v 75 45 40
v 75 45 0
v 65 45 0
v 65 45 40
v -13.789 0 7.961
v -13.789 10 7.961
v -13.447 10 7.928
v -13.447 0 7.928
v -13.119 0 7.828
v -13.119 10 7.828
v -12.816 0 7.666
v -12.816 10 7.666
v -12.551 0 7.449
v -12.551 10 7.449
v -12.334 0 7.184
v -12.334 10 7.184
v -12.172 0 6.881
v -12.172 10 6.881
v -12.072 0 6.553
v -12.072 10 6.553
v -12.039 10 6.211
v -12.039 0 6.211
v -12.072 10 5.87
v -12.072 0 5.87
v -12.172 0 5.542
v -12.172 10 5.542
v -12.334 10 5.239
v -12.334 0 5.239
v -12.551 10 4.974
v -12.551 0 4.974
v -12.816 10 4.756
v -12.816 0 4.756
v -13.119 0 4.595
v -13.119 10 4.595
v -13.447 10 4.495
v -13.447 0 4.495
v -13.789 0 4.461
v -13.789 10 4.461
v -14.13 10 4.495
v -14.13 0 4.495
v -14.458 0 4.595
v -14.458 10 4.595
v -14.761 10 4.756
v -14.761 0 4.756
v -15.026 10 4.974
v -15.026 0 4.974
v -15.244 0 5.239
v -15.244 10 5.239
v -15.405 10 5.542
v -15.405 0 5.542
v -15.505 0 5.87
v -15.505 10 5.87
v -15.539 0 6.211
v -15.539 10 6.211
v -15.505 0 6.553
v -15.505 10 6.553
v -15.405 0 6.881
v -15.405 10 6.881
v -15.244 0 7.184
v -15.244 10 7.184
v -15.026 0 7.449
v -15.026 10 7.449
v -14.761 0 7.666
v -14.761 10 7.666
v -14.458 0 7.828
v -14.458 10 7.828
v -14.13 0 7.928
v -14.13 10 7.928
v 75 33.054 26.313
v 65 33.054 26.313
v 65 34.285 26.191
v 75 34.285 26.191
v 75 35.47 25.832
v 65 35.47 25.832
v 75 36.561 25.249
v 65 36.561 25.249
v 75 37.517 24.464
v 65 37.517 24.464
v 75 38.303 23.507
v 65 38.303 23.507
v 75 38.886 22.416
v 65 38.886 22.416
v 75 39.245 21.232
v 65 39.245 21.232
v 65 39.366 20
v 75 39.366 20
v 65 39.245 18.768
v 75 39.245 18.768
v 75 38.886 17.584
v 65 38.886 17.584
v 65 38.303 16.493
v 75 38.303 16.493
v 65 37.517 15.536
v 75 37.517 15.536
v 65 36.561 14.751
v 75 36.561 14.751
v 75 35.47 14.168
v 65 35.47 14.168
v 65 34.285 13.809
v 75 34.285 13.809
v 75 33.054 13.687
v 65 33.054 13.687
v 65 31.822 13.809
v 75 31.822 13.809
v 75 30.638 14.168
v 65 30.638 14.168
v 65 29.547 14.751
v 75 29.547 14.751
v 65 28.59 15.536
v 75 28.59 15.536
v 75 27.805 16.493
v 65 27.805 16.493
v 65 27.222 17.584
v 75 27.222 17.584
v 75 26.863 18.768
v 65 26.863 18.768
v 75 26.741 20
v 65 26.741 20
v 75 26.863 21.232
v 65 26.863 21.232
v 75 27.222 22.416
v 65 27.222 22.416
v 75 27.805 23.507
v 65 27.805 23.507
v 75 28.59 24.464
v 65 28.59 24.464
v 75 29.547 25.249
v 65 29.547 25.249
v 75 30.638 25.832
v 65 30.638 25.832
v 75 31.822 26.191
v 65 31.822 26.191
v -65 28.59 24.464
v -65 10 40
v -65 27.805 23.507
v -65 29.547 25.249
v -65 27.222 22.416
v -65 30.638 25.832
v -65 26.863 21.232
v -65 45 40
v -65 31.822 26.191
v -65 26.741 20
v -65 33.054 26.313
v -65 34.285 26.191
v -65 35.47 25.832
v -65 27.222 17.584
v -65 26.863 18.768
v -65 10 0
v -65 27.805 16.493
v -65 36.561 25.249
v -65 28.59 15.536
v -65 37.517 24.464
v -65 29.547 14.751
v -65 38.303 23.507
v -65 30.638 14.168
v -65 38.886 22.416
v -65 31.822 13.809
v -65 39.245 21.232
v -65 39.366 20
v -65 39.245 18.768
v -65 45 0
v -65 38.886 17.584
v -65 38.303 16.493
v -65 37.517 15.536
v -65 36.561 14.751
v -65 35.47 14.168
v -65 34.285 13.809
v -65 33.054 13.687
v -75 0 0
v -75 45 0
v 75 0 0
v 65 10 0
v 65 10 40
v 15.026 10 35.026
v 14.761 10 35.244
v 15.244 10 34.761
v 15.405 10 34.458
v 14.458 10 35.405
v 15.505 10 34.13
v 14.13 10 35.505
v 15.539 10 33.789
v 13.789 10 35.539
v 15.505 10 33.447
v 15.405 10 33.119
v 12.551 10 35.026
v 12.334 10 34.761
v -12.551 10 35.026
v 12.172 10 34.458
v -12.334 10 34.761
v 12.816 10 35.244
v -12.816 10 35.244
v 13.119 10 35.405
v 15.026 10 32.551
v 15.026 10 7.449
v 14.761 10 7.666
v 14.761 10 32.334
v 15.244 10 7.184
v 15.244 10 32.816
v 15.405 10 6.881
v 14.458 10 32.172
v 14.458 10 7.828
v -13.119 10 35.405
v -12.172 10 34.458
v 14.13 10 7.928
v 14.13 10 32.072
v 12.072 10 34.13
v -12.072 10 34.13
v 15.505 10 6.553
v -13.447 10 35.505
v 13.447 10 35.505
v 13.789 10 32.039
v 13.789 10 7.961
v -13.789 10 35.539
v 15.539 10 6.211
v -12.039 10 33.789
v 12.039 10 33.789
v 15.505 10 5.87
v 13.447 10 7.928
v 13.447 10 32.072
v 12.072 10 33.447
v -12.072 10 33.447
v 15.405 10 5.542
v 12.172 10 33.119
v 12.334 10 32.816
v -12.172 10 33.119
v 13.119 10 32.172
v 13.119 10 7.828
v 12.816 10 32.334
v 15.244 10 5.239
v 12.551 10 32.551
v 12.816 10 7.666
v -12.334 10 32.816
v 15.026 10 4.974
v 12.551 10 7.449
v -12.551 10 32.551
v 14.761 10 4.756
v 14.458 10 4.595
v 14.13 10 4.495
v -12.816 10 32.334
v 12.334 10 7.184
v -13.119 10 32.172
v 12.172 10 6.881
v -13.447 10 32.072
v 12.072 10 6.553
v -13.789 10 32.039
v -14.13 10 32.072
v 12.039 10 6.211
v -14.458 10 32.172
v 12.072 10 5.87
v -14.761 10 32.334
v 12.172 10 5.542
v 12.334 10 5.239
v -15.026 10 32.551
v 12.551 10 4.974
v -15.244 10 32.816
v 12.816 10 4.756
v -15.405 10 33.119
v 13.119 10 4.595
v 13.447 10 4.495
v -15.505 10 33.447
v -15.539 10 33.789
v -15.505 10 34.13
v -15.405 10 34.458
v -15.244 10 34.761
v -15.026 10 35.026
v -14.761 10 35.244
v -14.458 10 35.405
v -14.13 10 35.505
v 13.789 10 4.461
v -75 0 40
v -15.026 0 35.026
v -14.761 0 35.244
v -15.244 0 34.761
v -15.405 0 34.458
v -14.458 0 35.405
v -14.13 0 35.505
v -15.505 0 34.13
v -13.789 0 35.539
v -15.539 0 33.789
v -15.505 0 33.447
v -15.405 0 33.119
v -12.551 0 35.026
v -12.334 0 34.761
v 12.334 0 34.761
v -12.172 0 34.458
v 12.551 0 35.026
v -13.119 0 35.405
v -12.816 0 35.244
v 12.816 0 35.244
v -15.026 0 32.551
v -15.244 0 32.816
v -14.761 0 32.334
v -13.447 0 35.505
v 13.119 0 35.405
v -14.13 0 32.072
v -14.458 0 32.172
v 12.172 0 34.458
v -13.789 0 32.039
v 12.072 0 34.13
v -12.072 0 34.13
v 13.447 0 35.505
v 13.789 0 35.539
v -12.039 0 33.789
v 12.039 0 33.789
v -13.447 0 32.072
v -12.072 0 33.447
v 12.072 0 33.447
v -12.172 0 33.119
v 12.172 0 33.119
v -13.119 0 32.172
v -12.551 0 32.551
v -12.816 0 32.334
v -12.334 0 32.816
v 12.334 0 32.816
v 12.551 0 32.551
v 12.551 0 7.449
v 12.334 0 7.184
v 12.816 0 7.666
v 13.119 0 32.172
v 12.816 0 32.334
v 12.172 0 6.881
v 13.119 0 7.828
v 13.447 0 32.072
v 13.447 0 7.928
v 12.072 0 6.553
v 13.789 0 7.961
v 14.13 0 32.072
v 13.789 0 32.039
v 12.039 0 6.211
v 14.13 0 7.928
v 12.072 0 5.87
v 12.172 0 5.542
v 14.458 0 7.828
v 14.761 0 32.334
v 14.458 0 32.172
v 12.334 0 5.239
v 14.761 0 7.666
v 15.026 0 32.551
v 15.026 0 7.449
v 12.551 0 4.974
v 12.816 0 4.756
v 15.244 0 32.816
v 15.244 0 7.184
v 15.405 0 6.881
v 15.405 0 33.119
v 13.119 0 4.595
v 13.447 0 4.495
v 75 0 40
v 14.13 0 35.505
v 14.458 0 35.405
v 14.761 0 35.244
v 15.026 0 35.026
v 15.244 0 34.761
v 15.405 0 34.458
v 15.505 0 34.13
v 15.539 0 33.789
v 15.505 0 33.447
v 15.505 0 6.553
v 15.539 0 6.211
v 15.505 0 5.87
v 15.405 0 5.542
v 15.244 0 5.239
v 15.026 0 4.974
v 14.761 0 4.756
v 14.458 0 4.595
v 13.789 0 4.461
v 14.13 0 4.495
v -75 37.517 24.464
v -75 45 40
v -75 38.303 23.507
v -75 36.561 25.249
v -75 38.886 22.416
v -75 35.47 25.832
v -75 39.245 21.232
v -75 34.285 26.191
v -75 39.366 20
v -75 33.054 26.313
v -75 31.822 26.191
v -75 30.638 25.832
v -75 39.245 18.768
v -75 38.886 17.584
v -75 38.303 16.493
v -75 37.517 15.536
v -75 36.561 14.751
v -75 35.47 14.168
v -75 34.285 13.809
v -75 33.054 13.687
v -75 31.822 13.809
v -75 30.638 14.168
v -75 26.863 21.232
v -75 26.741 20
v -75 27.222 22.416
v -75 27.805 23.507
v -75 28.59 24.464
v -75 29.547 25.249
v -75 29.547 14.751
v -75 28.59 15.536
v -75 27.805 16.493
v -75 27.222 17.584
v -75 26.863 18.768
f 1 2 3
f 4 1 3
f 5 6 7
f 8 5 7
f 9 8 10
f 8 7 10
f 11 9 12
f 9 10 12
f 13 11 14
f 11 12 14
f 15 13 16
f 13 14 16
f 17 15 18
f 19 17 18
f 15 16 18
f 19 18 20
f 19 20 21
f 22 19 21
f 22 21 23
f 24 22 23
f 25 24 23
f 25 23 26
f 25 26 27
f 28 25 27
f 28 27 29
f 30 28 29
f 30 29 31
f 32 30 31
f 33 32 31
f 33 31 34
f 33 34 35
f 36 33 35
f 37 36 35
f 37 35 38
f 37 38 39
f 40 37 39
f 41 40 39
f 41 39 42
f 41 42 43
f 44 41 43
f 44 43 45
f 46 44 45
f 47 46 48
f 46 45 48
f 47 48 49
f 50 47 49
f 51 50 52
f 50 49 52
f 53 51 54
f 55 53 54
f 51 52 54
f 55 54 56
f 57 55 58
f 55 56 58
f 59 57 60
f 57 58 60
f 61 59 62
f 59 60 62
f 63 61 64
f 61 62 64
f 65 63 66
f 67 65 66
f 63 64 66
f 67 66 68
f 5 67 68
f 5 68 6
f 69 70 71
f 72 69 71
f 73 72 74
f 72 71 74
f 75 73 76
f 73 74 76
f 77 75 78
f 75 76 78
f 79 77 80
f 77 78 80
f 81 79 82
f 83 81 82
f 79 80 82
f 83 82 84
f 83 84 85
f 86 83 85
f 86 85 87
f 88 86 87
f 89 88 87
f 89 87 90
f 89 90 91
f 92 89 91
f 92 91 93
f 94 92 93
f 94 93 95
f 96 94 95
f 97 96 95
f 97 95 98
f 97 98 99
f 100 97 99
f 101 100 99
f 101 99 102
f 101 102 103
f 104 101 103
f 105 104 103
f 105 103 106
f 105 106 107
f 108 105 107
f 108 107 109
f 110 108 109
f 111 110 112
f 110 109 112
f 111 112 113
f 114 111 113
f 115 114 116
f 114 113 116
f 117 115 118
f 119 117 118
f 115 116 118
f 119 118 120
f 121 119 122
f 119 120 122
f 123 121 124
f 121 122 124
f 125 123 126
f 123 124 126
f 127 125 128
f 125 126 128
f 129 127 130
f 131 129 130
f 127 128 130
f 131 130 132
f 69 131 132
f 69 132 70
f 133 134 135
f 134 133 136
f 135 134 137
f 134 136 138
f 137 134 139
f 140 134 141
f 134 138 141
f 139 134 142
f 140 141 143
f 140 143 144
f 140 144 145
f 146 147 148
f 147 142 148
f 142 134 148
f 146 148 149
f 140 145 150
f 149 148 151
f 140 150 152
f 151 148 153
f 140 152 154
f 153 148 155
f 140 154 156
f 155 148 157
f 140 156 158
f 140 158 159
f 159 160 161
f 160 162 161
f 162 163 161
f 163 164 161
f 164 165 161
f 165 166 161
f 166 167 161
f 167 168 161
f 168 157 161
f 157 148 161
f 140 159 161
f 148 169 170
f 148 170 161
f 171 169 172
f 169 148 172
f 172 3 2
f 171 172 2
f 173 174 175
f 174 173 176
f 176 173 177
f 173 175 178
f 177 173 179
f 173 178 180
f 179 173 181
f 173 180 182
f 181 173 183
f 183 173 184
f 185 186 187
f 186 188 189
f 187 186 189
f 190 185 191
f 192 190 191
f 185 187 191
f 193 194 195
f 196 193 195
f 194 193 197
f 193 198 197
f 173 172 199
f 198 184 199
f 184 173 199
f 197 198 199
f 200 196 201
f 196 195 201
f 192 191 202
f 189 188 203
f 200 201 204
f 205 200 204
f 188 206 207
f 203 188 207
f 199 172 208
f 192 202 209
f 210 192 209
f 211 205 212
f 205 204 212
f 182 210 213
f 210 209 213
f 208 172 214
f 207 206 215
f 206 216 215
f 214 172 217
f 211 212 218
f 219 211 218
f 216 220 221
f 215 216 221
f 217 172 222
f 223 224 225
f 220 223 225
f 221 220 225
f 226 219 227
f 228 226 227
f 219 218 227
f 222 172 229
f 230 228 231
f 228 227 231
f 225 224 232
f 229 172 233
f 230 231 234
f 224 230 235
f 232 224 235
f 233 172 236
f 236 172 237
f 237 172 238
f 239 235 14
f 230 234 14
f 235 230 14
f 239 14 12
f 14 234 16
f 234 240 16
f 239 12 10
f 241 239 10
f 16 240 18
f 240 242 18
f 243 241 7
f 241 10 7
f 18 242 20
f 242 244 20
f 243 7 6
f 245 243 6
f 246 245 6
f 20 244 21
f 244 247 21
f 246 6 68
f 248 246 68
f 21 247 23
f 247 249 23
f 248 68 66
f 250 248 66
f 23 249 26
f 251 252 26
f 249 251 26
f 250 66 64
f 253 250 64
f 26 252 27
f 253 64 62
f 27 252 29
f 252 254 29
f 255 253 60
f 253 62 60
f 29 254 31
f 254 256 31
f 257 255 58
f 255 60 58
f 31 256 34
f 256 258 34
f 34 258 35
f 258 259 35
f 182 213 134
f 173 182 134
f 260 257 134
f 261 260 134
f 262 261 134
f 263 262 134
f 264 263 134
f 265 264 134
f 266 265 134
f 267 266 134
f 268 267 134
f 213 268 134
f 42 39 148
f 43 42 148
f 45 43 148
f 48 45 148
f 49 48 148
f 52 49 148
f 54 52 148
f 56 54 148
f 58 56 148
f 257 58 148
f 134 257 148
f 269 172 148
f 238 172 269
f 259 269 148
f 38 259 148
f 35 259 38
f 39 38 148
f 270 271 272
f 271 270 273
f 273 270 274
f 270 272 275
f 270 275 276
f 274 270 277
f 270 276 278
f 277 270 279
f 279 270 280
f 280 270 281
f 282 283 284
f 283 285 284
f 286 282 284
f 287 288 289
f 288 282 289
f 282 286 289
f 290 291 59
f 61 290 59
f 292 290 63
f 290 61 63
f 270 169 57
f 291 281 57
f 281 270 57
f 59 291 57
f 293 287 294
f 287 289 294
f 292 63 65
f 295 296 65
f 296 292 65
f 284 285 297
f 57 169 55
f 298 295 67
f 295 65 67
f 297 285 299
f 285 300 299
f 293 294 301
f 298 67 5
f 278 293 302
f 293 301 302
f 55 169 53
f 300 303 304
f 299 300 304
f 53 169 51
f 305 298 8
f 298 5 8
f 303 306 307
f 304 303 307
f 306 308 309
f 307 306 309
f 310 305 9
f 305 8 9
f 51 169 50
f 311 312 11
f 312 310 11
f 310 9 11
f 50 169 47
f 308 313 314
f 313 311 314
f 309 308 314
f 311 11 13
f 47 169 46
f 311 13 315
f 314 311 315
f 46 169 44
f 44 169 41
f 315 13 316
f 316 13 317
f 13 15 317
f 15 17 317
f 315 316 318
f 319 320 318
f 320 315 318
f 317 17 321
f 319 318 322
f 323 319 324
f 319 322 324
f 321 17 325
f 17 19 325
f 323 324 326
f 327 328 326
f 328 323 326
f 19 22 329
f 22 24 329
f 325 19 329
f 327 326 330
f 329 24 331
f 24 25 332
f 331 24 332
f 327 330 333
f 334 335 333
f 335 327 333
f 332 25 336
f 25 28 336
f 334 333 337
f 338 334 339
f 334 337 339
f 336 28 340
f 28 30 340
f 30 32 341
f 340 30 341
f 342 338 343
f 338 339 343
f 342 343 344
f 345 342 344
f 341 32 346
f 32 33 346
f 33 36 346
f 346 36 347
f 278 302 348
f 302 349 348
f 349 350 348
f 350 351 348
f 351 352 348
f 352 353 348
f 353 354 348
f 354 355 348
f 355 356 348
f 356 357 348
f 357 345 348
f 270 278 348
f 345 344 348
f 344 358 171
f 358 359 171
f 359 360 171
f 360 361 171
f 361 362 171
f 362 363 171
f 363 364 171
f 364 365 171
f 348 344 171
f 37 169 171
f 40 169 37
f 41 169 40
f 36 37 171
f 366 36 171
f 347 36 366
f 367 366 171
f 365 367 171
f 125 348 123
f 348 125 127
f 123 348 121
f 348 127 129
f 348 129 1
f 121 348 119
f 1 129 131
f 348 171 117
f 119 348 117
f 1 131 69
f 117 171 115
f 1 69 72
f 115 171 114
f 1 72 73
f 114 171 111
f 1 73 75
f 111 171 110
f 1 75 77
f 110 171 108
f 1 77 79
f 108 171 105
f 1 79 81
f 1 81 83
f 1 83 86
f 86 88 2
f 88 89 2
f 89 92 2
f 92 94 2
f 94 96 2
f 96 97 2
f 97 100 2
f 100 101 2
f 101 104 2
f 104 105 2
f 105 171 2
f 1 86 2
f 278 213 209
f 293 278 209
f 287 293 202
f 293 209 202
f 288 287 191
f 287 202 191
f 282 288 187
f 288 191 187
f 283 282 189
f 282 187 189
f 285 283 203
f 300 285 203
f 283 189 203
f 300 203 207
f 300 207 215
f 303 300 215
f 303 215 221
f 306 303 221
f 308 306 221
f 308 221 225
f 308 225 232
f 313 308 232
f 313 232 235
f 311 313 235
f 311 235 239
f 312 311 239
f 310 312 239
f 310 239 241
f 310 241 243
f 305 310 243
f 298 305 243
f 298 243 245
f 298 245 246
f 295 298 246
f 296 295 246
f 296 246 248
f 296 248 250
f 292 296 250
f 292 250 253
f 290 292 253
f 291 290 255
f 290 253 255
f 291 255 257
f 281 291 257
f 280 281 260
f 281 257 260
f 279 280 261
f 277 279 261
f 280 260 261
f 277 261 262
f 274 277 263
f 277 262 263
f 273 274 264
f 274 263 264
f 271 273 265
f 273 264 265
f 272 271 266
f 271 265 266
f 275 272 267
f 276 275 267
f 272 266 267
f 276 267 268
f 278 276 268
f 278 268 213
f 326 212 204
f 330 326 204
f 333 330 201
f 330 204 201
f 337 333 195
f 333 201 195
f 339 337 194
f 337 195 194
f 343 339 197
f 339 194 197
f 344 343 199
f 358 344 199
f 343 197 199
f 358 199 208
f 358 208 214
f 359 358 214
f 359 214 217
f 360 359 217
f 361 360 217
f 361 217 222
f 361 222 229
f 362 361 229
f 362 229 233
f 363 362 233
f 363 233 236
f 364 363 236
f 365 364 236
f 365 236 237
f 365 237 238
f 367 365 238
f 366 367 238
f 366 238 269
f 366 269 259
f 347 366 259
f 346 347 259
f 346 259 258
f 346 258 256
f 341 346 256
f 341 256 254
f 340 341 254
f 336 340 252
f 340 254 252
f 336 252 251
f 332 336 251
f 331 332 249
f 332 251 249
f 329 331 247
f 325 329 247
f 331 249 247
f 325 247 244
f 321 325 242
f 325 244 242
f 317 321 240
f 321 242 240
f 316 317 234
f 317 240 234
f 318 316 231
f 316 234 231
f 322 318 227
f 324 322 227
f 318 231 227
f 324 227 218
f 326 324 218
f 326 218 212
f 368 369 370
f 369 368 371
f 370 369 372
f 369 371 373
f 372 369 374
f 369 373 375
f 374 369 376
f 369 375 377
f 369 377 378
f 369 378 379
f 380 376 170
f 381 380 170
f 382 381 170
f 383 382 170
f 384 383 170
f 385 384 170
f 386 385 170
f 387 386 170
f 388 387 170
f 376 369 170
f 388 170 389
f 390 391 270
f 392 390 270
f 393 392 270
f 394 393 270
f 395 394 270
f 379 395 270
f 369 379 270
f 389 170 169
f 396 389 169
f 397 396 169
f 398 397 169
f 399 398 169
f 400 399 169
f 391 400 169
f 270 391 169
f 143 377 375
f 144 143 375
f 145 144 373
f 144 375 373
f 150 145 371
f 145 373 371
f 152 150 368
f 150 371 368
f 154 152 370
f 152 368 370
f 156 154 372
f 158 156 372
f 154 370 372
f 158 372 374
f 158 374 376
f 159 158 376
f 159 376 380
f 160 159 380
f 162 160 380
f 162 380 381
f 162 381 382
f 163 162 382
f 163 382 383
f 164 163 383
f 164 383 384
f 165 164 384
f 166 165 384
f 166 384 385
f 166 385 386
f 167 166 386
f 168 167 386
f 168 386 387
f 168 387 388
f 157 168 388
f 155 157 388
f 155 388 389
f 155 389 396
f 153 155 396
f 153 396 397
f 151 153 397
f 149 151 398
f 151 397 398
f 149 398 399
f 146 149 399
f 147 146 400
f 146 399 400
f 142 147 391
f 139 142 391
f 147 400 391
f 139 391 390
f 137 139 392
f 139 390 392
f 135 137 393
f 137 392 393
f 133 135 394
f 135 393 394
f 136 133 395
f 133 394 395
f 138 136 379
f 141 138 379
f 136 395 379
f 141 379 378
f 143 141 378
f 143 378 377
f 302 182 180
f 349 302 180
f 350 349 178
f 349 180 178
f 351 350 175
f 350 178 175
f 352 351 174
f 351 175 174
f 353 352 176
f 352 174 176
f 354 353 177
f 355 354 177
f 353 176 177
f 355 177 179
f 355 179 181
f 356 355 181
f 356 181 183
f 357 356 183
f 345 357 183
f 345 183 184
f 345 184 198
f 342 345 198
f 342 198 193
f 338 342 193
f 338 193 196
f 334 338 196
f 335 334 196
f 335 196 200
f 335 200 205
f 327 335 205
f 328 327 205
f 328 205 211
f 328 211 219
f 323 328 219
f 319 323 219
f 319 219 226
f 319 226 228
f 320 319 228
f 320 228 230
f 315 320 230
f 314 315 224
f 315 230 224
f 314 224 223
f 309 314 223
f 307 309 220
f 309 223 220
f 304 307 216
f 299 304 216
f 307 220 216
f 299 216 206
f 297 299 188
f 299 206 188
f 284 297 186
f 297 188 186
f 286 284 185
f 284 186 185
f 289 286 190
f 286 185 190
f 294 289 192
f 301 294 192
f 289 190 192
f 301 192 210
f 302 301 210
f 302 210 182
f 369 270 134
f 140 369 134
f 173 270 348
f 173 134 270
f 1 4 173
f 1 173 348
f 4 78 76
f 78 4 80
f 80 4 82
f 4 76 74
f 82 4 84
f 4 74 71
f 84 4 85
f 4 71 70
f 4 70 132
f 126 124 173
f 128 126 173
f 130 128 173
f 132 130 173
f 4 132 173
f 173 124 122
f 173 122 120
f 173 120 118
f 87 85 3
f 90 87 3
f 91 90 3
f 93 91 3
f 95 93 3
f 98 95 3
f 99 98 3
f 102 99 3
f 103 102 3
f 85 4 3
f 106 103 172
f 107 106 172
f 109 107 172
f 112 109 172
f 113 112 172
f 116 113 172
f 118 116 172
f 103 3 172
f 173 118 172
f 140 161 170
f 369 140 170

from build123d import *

# Parameters (mm, degrees)
BOSS_EXTRU_1_DEPTH      = 40
ESQUISSE2_R             = 1.75
ENL_V_MAT_EXTRU_1_DEPTH = 92.923881554
ESQUISSE5_R             = 6.3126
ENL_V_MAT_EXTRU_2_DEPTH = 162.632298752


with BuildPart() as part:
    # Esquisse1 → Boss.-Extru.1 (new body)
    with BuildSketch(Plane.XY):
        Polygon((-65, 45), (-75, 45), (-75, 0), (75, 0), (75, 45), (65, 45), (65, 10), (-65, 10), align=None)
    extrude(amount=BOSS_EXTRU_1_DEPTH)

    # Esquisse2 → Enlèv. mat.-Extru.1 (cut, through all)
    with BuildSketch(Plane(origin=(0, 10, 0), x_dir=(1, 0, 0), z_dir=(0, 1, 0))):
        with Locations(Location((-13.788582233, -6.211417767, 0), (0, 0, 270))):
            Circle(ESQUISSE2_R)
        with Locations(Location((13.788582233, -6.211417767, 0), (0, 0, 270))):
            Circle(ESQUISSE2_R)
        with Locations(Location((13.788582233, -33.788582233, 0), (0, 0, 270))):
            Circle(ESQUISSE2_R)
        with Locations(Location((-13.788582233, -33.788582233, 0), (0, 0, 270))):
            Circle(ESQUISSE2_R)
    extrude(amount=-ENL_V_MAT_EXTRU_1_DEPTH, mode=Mode.SUBTRACT)

    # Esquisse5 → Enlèv. mat.-Extru.2 (cut, through all)
    with BuildSketch(Plane.ZY.offset(75)):
        with Locations((20, 33.0538058)):
            Circle(ESQUISSE5_R)
    extrude(amount=-ENL_V_MAT_EXTRU_2_DEPTH, mode=Mode.SUBTRACT)


solid = part.part
